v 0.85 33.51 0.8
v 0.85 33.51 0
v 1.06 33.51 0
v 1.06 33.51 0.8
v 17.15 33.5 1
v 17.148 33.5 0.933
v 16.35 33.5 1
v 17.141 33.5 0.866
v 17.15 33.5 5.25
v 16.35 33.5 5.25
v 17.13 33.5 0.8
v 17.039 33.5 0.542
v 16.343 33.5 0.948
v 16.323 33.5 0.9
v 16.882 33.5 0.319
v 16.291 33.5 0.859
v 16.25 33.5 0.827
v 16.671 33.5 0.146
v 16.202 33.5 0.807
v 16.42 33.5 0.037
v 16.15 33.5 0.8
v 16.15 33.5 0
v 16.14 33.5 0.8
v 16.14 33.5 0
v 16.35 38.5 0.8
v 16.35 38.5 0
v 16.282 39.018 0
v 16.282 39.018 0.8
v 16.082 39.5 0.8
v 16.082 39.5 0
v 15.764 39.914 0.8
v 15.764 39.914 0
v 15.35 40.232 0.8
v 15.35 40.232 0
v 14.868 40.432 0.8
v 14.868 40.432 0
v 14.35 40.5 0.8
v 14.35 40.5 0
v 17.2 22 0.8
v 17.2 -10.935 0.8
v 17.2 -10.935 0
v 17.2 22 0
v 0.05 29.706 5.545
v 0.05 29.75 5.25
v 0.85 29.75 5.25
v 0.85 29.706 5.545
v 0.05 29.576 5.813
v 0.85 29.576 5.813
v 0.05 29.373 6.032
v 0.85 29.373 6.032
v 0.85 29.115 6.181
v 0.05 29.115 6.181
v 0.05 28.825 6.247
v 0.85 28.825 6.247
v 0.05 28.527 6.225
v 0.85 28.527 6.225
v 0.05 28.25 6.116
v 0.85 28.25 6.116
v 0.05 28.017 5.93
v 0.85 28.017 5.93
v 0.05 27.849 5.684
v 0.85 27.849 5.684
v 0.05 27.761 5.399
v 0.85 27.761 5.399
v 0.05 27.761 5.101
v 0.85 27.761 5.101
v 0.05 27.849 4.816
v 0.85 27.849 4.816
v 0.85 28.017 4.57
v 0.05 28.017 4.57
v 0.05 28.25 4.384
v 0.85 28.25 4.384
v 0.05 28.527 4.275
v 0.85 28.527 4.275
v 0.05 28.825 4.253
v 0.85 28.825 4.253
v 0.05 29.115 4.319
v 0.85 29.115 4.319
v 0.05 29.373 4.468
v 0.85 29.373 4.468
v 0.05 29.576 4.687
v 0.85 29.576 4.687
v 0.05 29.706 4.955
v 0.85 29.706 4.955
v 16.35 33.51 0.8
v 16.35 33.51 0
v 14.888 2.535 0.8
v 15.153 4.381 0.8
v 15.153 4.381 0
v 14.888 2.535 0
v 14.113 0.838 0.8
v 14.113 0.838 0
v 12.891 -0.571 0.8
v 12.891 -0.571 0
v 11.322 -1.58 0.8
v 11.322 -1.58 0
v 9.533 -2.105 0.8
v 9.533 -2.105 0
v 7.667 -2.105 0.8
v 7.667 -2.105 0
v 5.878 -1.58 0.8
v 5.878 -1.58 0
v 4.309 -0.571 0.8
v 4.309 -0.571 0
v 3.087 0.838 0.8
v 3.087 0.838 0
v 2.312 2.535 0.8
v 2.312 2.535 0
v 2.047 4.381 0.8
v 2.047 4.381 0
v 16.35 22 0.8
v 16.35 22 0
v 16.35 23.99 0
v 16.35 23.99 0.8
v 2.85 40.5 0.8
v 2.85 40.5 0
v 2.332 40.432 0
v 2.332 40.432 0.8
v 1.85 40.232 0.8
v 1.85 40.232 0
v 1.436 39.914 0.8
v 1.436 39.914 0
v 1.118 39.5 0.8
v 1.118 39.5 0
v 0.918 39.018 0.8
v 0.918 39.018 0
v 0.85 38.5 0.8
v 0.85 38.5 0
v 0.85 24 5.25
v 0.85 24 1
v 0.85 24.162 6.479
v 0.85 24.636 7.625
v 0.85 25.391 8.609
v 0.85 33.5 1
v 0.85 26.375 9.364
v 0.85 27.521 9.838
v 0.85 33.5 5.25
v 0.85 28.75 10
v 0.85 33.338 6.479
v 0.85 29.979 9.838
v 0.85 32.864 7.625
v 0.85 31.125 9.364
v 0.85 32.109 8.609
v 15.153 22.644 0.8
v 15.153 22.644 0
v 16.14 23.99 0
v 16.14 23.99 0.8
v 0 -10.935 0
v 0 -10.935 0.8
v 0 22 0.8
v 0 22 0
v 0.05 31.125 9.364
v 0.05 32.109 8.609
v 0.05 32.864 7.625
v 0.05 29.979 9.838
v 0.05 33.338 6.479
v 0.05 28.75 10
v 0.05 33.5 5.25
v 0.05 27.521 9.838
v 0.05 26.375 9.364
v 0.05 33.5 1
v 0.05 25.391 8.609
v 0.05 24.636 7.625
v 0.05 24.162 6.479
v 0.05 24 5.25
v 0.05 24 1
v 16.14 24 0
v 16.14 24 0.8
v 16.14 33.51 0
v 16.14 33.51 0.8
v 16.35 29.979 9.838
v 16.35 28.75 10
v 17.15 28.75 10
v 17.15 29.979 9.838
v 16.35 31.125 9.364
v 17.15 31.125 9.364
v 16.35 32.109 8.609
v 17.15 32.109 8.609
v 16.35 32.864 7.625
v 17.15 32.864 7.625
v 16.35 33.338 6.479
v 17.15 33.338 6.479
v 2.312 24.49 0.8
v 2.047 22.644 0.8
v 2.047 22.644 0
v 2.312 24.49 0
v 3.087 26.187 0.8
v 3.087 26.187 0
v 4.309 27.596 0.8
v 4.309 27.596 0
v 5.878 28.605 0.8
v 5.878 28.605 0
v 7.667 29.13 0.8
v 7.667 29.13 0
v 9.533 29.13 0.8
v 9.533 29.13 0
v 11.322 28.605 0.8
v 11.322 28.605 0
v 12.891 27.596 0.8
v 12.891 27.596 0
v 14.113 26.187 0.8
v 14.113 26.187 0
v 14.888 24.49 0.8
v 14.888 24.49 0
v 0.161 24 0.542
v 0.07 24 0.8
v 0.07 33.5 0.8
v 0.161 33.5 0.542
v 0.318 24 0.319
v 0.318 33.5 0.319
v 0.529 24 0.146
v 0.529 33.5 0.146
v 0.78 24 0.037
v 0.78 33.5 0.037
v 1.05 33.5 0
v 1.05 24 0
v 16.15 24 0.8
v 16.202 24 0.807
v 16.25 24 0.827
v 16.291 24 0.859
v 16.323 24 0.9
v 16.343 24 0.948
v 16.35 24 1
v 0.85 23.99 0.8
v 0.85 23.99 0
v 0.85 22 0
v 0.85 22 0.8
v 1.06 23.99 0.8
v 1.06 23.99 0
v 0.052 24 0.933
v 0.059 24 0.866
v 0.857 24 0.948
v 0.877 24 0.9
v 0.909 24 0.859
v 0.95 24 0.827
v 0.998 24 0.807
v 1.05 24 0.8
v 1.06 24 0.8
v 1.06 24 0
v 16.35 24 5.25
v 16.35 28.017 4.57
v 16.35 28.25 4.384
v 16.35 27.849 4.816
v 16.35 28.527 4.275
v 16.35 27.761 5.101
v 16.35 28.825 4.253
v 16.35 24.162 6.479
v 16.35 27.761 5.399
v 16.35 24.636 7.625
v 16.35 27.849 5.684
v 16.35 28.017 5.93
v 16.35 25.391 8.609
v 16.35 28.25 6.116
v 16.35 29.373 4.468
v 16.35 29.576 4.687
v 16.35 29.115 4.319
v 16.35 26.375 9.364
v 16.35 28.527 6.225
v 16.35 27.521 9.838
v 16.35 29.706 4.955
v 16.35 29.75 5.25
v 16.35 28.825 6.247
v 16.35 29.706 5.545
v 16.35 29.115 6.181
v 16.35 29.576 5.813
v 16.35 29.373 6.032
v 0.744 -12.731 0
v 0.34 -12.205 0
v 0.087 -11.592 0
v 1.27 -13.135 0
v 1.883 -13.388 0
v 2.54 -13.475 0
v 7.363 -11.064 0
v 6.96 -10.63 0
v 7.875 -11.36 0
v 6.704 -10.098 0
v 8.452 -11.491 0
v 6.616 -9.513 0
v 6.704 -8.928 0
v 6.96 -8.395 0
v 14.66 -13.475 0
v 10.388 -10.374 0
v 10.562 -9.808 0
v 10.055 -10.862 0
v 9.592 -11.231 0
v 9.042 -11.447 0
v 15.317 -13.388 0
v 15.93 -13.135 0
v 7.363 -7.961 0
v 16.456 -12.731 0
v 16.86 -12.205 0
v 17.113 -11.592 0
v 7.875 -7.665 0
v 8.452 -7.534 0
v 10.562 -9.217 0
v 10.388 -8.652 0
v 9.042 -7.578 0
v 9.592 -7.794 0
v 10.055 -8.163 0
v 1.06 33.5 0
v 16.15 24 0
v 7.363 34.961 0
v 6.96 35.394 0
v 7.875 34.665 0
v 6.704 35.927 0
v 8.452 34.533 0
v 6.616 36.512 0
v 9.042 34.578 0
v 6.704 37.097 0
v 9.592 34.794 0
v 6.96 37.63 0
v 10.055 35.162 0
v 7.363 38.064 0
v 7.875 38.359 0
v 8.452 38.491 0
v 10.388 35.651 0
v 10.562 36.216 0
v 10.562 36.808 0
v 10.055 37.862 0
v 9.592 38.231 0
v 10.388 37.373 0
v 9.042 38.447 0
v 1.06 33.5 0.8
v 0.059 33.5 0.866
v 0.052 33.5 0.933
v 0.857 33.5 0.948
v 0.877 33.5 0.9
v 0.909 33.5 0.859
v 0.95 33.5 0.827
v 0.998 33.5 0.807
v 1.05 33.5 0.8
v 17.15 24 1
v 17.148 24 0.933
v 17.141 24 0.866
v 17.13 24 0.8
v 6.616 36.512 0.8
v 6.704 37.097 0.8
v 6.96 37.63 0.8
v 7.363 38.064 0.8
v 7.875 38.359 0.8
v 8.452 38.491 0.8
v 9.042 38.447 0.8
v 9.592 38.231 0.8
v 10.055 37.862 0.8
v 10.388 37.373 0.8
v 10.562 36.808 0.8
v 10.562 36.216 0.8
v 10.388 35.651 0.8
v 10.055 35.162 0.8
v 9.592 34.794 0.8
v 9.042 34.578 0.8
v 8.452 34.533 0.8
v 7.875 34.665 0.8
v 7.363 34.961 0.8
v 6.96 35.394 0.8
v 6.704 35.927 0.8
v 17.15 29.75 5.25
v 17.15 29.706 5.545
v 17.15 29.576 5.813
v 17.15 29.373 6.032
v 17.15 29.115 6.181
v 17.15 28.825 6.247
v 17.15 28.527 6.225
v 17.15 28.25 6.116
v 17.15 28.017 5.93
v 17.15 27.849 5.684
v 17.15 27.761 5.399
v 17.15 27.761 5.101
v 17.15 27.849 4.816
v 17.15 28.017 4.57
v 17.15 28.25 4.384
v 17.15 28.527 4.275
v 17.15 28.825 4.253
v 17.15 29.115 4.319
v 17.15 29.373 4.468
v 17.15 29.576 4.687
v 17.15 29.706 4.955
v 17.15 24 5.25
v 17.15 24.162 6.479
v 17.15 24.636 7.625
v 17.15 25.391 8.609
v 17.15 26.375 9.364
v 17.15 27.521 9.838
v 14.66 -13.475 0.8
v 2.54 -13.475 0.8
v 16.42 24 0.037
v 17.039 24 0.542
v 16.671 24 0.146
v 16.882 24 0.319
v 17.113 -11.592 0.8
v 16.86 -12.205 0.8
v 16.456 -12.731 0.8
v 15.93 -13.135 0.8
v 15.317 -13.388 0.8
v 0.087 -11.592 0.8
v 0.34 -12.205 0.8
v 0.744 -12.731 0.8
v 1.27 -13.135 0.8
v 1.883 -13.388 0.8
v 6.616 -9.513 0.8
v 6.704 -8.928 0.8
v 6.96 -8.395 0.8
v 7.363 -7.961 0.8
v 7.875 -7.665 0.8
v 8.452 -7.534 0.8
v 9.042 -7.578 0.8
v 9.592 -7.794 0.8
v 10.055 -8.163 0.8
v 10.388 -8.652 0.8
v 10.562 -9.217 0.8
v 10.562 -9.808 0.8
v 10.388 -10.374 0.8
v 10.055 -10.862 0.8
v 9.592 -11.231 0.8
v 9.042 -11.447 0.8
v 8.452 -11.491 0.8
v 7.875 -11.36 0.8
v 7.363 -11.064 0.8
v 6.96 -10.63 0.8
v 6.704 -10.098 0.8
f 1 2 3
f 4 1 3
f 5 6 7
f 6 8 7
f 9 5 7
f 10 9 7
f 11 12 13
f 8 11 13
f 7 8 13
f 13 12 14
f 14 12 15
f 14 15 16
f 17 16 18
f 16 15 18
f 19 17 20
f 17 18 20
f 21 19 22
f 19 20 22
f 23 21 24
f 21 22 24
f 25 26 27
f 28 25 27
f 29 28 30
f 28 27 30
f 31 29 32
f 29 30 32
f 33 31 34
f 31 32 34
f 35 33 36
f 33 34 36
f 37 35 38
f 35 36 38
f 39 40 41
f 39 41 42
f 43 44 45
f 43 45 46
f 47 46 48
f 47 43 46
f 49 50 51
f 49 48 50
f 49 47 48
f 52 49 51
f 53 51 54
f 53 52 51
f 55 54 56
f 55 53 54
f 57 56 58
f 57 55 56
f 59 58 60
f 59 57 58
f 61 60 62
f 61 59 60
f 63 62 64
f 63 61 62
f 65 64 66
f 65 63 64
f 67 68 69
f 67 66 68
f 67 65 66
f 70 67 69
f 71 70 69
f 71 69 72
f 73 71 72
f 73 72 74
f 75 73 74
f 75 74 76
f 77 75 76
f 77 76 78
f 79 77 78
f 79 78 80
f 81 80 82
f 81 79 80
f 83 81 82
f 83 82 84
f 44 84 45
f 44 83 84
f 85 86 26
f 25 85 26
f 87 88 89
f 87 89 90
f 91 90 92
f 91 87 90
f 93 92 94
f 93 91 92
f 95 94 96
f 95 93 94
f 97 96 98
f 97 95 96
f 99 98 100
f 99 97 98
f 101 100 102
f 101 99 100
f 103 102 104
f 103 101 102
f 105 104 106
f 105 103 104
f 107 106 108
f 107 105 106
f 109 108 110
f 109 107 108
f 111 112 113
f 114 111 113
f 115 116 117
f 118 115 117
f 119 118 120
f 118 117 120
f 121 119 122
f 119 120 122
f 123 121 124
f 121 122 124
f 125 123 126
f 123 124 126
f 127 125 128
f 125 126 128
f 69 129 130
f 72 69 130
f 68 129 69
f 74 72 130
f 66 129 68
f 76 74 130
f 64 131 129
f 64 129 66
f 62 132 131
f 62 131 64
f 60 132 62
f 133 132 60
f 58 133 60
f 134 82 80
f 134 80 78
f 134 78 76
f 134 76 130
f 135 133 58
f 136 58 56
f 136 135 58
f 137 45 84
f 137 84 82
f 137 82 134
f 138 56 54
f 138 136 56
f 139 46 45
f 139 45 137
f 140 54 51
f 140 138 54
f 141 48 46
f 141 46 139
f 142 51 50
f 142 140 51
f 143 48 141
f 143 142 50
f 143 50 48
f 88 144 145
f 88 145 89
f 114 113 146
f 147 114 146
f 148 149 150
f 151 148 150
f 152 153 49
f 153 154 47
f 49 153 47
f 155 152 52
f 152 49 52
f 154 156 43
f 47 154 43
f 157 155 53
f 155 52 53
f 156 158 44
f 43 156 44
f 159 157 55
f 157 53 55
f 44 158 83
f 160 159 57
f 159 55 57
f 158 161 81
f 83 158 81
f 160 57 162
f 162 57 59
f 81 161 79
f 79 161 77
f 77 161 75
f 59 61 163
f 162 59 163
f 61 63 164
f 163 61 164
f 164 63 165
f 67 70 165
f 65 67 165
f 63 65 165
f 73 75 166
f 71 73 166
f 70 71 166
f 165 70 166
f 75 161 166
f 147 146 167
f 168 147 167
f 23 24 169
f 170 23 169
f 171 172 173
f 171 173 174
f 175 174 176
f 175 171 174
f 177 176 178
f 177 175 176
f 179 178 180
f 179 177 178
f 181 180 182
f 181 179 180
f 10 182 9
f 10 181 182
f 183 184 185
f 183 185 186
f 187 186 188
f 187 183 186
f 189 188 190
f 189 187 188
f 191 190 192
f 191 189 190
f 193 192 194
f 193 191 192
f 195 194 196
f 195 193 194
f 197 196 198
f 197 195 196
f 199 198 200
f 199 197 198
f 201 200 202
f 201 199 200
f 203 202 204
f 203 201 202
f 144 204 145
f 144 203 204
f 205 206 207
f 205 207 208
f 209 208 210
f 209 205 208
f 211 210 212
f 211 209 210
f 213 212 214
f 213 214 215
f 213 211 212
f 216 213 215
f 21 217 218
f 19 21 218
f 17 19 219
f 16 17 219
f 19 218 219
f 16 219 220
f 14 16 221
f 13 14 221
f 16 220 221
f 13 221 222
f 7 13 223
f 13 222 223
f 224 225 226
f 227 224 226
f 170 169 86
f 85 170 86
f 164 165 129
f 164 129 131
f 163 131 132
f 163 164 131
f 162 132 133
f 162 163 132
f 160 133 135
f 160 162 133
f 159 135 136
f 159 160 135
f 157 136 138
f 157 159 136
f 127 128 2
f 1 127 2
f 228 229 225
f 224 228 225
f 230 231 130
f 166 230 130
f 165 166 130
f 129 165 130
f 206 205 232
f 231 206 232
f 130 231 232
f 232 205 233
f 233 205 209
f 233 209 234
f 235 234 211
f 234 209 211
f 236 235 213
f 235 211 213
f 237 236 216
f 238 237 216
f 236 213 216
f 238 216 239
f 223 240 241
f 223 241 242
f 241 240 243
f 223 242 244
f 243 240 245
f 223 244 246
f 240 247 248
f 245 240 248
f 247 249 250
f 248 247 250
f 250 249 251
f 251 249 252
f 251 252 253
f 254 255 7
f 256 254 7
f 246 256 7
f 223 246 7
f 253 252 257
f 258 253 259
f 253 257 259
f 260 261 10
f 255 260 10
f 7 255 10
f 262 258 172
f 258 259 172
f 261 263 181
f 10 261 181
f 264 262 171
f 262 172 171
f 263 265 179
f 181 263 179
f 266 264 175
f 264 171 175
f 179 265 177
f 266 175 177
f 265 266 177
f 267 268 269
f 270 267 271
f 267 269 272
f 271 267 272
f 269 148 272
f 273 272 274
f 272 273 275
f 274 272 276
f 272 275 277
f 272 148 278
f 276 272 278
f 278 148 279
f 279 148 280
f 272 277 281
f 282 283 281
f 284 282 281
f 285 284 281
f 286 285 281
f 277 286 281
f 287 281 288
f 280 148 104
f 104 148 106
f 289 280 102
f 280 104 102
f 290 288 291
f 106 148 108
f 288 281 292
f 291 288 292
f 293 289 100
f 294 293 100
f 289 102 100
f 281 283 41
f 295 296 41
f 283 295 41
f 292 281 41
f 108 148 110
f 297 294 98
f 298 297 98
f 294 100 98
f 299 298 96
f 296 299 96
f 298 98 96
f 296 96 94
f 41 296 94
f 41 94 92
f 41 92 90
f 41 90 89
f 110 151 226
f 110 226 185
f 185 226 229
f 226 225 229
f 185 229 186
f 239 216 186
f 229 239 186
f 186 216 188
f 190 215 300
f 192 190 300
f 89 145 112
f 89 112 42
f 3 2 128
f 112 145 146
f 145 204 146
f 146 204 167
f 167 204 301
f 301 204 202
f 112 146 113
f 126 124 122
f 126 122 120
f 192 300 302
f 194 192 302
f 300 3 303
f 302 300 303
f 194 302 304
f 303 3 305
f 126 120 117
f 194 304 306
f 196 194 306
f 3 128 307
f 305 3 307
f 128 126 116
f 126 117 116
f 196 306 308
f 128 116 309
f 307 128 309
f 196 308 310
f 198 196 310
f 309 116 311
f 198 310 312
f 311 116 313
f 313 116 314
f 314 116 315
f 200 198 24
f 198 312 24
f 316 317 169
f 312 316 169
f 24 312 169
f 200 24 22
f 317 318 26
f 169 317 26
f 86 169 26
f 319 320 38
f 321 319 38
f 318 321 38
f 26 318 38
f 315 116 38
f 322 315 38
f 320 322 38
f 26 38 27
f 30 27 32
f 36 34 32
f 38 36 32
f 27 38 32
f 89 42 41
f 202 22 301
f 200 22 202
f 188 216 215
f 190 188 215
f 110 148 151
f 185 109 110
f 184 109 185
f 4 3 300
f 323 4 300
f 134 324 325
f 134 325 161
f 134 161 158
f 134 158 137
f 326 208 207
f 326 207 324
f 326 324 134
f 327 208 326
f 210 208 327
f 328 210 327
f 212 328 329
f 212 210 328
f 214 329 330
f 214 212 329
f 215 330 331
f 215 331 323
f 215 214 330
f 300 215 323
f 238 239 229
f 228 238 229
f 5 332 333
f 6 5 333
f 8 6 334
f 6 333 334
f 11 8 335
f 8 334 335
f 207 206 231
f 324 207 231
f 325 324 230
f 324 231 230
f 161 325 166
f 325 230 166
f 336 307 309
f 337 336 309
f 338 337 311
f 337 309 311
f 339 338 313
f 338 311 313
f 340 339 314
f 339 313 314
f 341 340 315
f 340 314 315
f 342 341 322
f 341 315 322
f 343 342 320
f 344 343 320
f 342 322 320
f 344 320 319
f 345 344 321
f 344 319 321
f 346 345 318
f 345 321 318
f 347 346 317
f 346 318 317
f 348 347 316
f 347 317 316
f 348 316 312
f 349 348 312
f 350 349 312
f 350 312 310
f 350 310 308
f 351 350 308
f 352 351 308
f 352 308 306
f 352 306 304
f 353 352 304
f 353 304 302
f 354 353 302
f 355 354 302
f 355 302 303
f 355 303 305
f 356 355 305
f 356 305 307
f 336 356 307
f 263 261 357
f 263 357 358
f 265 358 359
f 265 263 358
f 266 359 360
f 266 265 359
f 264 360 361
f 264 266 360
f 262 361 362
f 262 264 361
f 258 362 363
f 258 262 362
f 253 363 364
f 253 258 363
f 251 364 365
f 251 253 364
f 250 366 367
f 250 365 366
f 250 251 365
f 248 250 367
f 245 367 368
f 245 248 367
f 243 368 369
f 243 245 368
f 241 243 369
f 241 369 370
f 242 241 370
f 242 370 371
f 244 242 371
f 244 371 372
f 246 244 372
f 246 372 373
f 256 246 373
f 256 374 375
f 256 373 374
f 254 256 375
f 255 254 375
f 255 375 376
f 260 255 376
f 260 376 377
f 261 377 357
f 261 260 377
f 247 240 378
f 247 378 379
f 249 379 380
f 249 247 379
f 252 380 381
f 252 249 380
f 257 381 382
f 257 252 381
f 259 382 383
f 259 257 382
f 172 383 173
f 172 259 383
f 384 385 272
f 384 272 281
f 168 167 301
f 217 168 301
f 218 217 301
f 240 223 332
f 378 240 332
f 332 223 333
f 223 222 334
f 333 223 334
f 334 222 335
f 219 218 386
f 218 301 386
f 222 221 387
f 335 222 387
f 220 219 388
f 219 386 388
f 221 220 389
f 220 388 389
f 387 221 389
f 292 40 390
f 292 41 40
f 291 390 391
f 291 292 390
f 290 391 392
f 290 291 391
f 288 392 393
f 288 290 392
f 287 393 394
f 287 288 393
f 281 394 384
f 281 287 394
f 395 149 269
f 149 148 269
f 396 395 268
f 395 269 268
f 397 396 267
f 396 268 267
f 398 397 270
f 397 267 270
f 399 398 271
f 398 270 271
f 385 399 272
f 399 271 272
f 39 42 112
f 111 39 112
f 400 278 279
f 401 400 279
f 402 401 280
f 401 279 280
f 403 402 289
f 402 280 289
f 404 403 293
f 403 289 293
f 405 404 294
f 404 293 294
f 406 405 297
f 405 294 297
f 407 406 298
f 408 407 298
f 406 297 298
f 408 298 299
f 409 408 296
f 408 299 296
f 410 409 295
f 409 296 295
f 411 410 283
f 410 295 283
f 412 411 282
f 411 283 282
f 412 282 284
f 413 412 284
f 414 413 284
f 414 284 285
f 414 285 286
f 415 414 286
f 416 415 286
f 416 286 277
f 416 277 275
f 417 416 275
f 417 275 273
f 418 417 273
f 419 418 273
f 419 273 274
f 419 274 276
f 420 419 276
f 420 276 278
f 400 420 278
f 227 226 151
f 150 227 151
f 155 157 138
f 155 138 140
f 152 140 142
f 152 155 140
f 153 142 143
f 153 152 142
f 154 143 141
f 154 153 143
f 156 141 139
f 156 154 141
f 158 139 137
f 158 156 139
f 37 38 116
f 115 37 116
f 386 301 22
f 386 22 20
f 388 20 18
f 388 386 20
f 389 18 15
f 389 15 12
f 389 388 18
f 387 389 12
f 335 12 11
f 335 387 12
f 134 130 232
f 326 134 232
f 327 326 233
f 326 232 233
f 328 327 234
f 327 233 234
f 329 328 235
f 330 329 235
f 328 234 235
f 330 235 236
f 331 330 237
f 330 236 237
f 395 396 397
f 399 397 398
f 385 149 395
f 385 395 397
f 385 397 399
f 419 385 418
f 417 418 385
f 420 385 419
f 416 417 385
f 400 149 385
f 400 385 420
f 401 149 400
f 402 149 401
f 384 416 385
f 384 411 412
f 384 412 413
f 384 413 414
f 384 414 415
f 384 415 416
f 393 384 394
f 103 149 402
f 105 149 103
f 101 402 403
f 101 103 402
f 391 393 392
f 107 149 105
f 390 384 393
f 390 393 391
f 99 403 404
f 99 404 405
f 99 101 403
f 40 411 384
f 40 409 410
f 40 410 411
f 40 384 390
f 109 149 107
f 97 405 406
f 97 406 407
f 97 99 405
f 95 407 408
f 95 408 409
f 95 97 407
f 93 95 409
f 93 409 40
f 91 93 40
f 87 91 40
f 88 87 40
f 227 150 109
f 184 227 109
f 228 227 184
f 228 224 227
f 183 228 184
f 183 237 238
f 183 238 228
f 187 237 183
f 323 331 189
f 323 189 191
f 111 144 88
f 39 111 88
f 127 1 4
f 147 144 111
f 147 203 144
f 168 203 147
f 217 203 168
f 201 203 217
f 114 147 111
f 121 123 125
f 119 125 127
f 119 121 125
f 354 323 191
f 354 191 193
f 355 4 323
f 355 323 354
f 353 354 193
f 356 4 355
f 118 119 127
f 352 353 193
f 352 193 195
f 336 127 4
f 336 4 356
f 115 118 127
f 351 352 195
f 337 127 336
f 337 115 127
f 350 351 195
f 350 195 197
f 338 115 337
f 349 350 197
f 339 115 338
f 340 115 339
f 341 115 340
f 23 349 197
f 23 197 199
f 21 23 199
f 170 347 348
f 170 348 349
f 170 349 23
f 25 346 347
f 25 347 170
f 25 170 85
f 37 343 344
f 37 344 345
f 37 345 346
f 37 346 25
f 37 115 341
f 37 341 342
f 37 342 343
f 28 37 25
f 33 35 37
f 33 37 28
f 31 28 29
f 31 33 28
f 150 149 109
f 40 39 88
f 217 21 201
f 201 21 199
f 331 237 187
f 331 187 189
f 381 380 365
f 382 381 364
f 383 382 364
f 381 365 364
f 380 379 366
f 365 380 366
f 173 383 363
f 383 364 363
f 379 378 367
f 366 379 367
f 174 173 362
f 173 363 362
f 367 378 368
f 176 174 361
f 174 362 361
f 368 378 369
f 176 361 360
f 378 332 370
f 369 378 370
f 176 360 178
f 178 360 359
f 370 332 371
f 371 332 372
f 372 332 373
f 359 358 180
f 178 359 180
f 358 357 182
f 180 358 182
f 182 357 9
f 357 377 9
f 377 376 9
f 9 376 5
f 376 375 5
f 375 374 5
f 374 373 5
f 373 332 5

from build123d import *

# Parameters (mm, degrees)
BOSS_EXTRUDE1_START             = -0.8
BOSS_EXTRUDE1_DEPTH             = 1
BOSS_EXTRUDE1_2_OUTLINE_W       = 0.8
BOSS_EXTRUDE1_2_OUTLINE_H       = 9.5
BOSS_EXTRUDE1_2_DEPTH           = 9.2
BOSS_EXTRUDE1_START_2           = 0.85
BOSS_EXTRUDE1_3_OUTLINE_W       = 40.5
BOSS_EXTRUDE1_3_OUTLINE_H       = 0.2
BOSS_EXTRUDE1_3_DEPTH           = 15.5
BOSS_EXTRUDE1_4_OUTLINE_R       = 1
BOSS_EXTRUDE1_4_OUTLINE_W       = 22
BOSS_EXTRUDE1_4_OUTLINE_H       = 0.2
BOSS_EXTRUDE1_4_DEPTH           = 17.2
BOSS_EXTRUDE1_START_3           = 17.112671
BOSS_EXTRUDE1_5_OUTLINE_W       = 9.5
BOSS_EXTRUDE1_5_OUTLINE_H       = 0.2
BOSS_EXTRUDE1_5_DEPTH           = 0.037329
BOSS_EXTRUDE1_START_4           = 0.05
BOSS_EXTRUDE1_6_OUTLINE_W       = 9.5
BOSS_EXTRUDE1_6_OUTLINE_H       = 0.2
BOSS_EXTRUDE1_6_DEPTH           = 0.032671
BOSS_EXTRUDE1_START_5           = 24
BOSS_EXTRUDE1_7_DEPTH           = 9.5
BOSS_EXTRUDE1_8_DEPTH           = 9.5
SKETCH2_W                       = 17.2
SKETCH2_H                       = 35.475
BOSS_EXTRUDE2_DEPTH             = 0.8
FILLET1_R                       = 2.54
F_5_32_0_15625_DIAMETER_HOLE1_D = 3.96875
CUT_EXTRUDE1_DEPTH              = 45.952530518


with BuildPart() as part:
    # Boss-Extrude1: read off the stored shape, not the designer's step
    # Boss-Extrude1 outline → Boss-Extrude1 (new body)
    with BuildSketch(Plane.XY.offset(0.8).offset(BOSS_EXTRUDE1_START)):
        with BuildLine():
            Line((0.05, 24), (1.06, 24))
            Line((1.06, 24), (1.06, 23.99))
            Line((1.06, 23.99), (0.85, 23.99))
            Line((0.85, 23.99), (0.85, 22))
            Line((0.85, 22), (0, 22))
            Line((0, 22), (0, 2))
            ThreePointArc((0, 2), (0.585786438, 0.585786438), (2, 0))
            Line((2, 0), (15.2, 0))
            ThreePointArc((15.2, 0), (16.614213562, 0.585786438), (17.2, 2))
            Line((17.2, 2), (17.2, 22))
            Line((17.2, 22), (16.35, 22))
            Line((16.35, 22), (16.35, 23.99))
            Line((16.35, 23.99), (16.14, 23.99))
            Line((16.14, 23.99), (16.14, 24))
            Line((16.14, 24), (17.15, 24))
            Line((17.15, 24), (17.15, 33.5))
            Line((17.15, 33.5), (16.14, 33.5))
            Line((16.14, 33.5), (16.14, 33.51))
            Line((16.14, 33.51), (16.35, 33.51))
            Line((16.35, 33.51), (16.35, 38.5))
            ThreePointArc((16.35, 38.5), (15.764213562, 39.914213562), (14.35, 40.5))
            Line((14.35, 40.5), (2.85, 40.5))
            ThreePointArc((2.85, 40.5), (1.435786438, 39.914213562), (0.85, 38.5))
            Line((0.85, 38.5), (0.85, 33.51))
            Line((0.85, 33.51), (1.06, 33.51))
            Line((1.06, 33.51), (1.06, 33.5))
            Line((1.06, 33.5), (0.05, 33.5))
            Line((0.05, 33.5), (0.05, 24))
        make_face()
    extrude(amount=BOSS_EXTRUDE1_DEPTH)

    # Boss-Extrude1 2 outline → Boss-Extrude1 2 (add)
    with BuildSketch(Plane.XY.offset(0.8)):
        with Locations((0.45, 28.75)):
            Rectangle(BOSS_EXTRUDE1_2_OUTLINE_W, BOSS_EXTRUDE1_2_OUTLINE_H)
        with Locations((16.75, 28.75)):
            Rectangle(BOSS_EXTRUDE1_2_OUTLINE_W, BOSS_EXTRUDE1_2_OUTLINE_H)
    extrude(amount=BOSS_EXTRUDE1_2_DEPTH)

    # Boss-Extrude1 3 outline → Boss-Extrude1 3 (cut)
    with BuildSketch(Plane.YZ.offset(BOSS_EXTRUDE1_START_2)):
        with Locations((20.25, 0.9)):
            Rectangle(BOSS_EXTRUDE1_3_OUTLINE_W, BOSS_EXTRUDE1_3_OUTLINE_H)
    extrude(amount=BOSS_EXTRUDE1_3_DEPTH, mode=Mode.SUBTRACT)

    # Boss-Extrude1 4 outline → Boss-Extrude1 4 (cut)
    with BuildSketch(Plane.YZ):
        with Locations((28.75, 5.25)):
            Circle(BOSS_EXTRUDE1_4_OUTLINE_R)
        with BuildLine():
            ThreePointArc((28.75, 10), (32.108757211, 8.608757211), (33.5, 5.25))
            Line((33.5, 5.25), (33.5, 10))
            Line((33.5, 10), (28.75, 10))
        make_face()
        with BuildLine():
            ThreePointArc((24, 5.25), (25.391242789, 8.608757211), (28.75, 10))
            Line((28.75, 10), (24, 10))
            Line((24, 10), (24, 5.25))
        make_face()
        with Locations((11, 0.9)):
            Rectangle(BOSS_EXTRUDE1_4_OUTLINE_W, BOSS_EXTRUDE1_4_OUTLINE_H)
    extrude(amount=BOSS_EXTRUDE1_4_DEPTH, mode=Mode.SUBTRACT)

    # Boss-Extrude1 5 outline → Boss-Extrude1 5 (cut)
    with BuildSketch(Plane.YZ.offset(BOSS_EXTRUDE1_START_3)):
        with Locations((28.75, 0.9)):
            Rectangle(BOSS_EXTRUDE1_5_OUTLINE_W, BOSS_EXTRUDE1_5_OUTLINE_H)
    extrude(amount=BOSS_EXTRUDE1_5_DEPTH, mode=Mode.SUBTRACT)

    # Boss-Extrude1 6 outline → Boss-Extrude1 6 (cut)
    with BuildSketch(Plane.YZ.offset(BOSS_EXTRUDE1_START_4)):
        with Locations((28.75, 0.9)):
            Rectangle(BOSS_EXTRUDE1_6_OUTLINE_W, BOSS_EXTRUDE1_6_OUTLINE_H)
    extrude(amount=BOSS_EXTRUDE1_6_DEPTH, mode=Mode.SUBTRACT)

    # Boss-Extrude1 7 outline → Boss-Extrude1 7 (cut)
    with BuildSketch(Plane(origin=(0, 0, 0), x_dir=(1, 0, 0), z_dir=(0, 1, 0)).offset(BOSS_EXTRUDE1_START_5)):
        with BuildLine():
            Line((0.05, -0.8), (0.070204103, -0.8))
            ThreePointArc((0.070204103, -0.8), (0.417544468, -0.225403331), (1.05, 0))
            Line((1.05, 0), (0.05, 0))
            Line((0.05, 0), (0.05, -0.8))
        make_face()
        with BuildLine():
            ThreePointArc((16.15, 0), (16.782455532, -0.225403331), (17.129795897, -0.8))
            Line((17.129795897, -0.8), (17.15, -0.8))
            Line((17.15, -0.8), (17.15, 0))
            Line((17.15, 0), (16.15, 0))
        make_face()
    extrude(amount=BOSS_EXTRUDE1_7_DEPTH, mode=Mode.SUBTRACT)

    # Boss-Extrude1 8 outline → Boss-Extrude1 8 (add)
    with BuildSketch(Plane(origin=(0, 0, 0), x_dir=(1, 0, 0), z_dir=(0, 1, 0)).offset(BOSS_EXTRUDE1_START_5)):
        with BuildLine():
            Line((0.85, -0.8), (0.85, -1))
            ThreePointArc((0.85, -1), (0.908578644, -0.858578644), (1.05, -0.8))
            Line((1.05, -0.8), (0.85, -0.8))
        make_face()
        with BuildLine():
            Line((16.35, -0.8), (16.15, -0.8))
            ThreePointArc((16.15, -0.8), (16.291421356, -0.858578644), (16.35, -1))
            Line((16.35, -1), (16.35, -0.8))
        make_face()
        with BuildLine():
            Line((0.082671, -1), (0.082671, -0.8))
            Line((0.082671, -0.8), (0.070204103, -0.8))
            ThreePointArc((0.070204103, -0.8), (0.055063847, -0.899491038), (0.05, -1))
            Line((0.05, -1), (0.082671, -1))
        make_face()
        with BuildLine():
            Line((17.129795897, -0.8), (17.112671, -0.8))
            Line((17.112671, -0.8), (17.112671, -1))
            Line((17.112671, -1), (17.15, -1))
            ThreePointArc((17.15, -1), (17.144936153, -0.899491038), (17.129795897, -0.8))
        make_face()
    extrude(amount=BOSS_EXTRUDE1_8_DEPTH)

    # Sketch2 → Boss-Extrude2 (add)
    with BuildSketch(Plane.XY.offset(0.8)):
        with Locations((8.6, 4.2625)):
            Rectangle(SKETCH2_W, SKETCH2_H)
    extrude(amount=-BOSS_EXTRUDE2_DEPTH)

    # Fillet1
    fillet1_edges = [part.edges().sort_by_distance(p)[0] for p in [
        (0, -13.475, 0.4),
        (17.2, -13.475, 0.4),
    ]]
    fillet(fillet1_edges, radius=FILLET1_R)

    # 5/32 (0.15625) Diameter Hole1 (through all)
    with Locations(Plane.XY.offset(0.8)):
        with Locations((8.6, -9.5126), (8.6, 36.5122)):
            Hole(F_5_32_0_15625_DIAMETER_HOLE1_D / 2)

    # Sketch5 → Cut-Extrude1 (cut, through all)
    with BuildSketch(Plane.XY.offset(0.8)):
        with BuildLine():
            Line((2.0468, 4.3812), (2.0468, 22.6438))
            ThreePointArc((2.0468, 22.6438), (8.6, 29.197), (15.1532, 22.6438))
            Line((15.1532, 22.6438), (15.1532, 4.3812))
            ThreePointArc((15.1532, 4.3812), (8.6, -2.172), (2.0468, 4.3812))
        make_face()
    extrude(amount=-CUT_EXTRUDE1_DEPTH, mode=Mode.SUBTRACT)


solid = part.part
